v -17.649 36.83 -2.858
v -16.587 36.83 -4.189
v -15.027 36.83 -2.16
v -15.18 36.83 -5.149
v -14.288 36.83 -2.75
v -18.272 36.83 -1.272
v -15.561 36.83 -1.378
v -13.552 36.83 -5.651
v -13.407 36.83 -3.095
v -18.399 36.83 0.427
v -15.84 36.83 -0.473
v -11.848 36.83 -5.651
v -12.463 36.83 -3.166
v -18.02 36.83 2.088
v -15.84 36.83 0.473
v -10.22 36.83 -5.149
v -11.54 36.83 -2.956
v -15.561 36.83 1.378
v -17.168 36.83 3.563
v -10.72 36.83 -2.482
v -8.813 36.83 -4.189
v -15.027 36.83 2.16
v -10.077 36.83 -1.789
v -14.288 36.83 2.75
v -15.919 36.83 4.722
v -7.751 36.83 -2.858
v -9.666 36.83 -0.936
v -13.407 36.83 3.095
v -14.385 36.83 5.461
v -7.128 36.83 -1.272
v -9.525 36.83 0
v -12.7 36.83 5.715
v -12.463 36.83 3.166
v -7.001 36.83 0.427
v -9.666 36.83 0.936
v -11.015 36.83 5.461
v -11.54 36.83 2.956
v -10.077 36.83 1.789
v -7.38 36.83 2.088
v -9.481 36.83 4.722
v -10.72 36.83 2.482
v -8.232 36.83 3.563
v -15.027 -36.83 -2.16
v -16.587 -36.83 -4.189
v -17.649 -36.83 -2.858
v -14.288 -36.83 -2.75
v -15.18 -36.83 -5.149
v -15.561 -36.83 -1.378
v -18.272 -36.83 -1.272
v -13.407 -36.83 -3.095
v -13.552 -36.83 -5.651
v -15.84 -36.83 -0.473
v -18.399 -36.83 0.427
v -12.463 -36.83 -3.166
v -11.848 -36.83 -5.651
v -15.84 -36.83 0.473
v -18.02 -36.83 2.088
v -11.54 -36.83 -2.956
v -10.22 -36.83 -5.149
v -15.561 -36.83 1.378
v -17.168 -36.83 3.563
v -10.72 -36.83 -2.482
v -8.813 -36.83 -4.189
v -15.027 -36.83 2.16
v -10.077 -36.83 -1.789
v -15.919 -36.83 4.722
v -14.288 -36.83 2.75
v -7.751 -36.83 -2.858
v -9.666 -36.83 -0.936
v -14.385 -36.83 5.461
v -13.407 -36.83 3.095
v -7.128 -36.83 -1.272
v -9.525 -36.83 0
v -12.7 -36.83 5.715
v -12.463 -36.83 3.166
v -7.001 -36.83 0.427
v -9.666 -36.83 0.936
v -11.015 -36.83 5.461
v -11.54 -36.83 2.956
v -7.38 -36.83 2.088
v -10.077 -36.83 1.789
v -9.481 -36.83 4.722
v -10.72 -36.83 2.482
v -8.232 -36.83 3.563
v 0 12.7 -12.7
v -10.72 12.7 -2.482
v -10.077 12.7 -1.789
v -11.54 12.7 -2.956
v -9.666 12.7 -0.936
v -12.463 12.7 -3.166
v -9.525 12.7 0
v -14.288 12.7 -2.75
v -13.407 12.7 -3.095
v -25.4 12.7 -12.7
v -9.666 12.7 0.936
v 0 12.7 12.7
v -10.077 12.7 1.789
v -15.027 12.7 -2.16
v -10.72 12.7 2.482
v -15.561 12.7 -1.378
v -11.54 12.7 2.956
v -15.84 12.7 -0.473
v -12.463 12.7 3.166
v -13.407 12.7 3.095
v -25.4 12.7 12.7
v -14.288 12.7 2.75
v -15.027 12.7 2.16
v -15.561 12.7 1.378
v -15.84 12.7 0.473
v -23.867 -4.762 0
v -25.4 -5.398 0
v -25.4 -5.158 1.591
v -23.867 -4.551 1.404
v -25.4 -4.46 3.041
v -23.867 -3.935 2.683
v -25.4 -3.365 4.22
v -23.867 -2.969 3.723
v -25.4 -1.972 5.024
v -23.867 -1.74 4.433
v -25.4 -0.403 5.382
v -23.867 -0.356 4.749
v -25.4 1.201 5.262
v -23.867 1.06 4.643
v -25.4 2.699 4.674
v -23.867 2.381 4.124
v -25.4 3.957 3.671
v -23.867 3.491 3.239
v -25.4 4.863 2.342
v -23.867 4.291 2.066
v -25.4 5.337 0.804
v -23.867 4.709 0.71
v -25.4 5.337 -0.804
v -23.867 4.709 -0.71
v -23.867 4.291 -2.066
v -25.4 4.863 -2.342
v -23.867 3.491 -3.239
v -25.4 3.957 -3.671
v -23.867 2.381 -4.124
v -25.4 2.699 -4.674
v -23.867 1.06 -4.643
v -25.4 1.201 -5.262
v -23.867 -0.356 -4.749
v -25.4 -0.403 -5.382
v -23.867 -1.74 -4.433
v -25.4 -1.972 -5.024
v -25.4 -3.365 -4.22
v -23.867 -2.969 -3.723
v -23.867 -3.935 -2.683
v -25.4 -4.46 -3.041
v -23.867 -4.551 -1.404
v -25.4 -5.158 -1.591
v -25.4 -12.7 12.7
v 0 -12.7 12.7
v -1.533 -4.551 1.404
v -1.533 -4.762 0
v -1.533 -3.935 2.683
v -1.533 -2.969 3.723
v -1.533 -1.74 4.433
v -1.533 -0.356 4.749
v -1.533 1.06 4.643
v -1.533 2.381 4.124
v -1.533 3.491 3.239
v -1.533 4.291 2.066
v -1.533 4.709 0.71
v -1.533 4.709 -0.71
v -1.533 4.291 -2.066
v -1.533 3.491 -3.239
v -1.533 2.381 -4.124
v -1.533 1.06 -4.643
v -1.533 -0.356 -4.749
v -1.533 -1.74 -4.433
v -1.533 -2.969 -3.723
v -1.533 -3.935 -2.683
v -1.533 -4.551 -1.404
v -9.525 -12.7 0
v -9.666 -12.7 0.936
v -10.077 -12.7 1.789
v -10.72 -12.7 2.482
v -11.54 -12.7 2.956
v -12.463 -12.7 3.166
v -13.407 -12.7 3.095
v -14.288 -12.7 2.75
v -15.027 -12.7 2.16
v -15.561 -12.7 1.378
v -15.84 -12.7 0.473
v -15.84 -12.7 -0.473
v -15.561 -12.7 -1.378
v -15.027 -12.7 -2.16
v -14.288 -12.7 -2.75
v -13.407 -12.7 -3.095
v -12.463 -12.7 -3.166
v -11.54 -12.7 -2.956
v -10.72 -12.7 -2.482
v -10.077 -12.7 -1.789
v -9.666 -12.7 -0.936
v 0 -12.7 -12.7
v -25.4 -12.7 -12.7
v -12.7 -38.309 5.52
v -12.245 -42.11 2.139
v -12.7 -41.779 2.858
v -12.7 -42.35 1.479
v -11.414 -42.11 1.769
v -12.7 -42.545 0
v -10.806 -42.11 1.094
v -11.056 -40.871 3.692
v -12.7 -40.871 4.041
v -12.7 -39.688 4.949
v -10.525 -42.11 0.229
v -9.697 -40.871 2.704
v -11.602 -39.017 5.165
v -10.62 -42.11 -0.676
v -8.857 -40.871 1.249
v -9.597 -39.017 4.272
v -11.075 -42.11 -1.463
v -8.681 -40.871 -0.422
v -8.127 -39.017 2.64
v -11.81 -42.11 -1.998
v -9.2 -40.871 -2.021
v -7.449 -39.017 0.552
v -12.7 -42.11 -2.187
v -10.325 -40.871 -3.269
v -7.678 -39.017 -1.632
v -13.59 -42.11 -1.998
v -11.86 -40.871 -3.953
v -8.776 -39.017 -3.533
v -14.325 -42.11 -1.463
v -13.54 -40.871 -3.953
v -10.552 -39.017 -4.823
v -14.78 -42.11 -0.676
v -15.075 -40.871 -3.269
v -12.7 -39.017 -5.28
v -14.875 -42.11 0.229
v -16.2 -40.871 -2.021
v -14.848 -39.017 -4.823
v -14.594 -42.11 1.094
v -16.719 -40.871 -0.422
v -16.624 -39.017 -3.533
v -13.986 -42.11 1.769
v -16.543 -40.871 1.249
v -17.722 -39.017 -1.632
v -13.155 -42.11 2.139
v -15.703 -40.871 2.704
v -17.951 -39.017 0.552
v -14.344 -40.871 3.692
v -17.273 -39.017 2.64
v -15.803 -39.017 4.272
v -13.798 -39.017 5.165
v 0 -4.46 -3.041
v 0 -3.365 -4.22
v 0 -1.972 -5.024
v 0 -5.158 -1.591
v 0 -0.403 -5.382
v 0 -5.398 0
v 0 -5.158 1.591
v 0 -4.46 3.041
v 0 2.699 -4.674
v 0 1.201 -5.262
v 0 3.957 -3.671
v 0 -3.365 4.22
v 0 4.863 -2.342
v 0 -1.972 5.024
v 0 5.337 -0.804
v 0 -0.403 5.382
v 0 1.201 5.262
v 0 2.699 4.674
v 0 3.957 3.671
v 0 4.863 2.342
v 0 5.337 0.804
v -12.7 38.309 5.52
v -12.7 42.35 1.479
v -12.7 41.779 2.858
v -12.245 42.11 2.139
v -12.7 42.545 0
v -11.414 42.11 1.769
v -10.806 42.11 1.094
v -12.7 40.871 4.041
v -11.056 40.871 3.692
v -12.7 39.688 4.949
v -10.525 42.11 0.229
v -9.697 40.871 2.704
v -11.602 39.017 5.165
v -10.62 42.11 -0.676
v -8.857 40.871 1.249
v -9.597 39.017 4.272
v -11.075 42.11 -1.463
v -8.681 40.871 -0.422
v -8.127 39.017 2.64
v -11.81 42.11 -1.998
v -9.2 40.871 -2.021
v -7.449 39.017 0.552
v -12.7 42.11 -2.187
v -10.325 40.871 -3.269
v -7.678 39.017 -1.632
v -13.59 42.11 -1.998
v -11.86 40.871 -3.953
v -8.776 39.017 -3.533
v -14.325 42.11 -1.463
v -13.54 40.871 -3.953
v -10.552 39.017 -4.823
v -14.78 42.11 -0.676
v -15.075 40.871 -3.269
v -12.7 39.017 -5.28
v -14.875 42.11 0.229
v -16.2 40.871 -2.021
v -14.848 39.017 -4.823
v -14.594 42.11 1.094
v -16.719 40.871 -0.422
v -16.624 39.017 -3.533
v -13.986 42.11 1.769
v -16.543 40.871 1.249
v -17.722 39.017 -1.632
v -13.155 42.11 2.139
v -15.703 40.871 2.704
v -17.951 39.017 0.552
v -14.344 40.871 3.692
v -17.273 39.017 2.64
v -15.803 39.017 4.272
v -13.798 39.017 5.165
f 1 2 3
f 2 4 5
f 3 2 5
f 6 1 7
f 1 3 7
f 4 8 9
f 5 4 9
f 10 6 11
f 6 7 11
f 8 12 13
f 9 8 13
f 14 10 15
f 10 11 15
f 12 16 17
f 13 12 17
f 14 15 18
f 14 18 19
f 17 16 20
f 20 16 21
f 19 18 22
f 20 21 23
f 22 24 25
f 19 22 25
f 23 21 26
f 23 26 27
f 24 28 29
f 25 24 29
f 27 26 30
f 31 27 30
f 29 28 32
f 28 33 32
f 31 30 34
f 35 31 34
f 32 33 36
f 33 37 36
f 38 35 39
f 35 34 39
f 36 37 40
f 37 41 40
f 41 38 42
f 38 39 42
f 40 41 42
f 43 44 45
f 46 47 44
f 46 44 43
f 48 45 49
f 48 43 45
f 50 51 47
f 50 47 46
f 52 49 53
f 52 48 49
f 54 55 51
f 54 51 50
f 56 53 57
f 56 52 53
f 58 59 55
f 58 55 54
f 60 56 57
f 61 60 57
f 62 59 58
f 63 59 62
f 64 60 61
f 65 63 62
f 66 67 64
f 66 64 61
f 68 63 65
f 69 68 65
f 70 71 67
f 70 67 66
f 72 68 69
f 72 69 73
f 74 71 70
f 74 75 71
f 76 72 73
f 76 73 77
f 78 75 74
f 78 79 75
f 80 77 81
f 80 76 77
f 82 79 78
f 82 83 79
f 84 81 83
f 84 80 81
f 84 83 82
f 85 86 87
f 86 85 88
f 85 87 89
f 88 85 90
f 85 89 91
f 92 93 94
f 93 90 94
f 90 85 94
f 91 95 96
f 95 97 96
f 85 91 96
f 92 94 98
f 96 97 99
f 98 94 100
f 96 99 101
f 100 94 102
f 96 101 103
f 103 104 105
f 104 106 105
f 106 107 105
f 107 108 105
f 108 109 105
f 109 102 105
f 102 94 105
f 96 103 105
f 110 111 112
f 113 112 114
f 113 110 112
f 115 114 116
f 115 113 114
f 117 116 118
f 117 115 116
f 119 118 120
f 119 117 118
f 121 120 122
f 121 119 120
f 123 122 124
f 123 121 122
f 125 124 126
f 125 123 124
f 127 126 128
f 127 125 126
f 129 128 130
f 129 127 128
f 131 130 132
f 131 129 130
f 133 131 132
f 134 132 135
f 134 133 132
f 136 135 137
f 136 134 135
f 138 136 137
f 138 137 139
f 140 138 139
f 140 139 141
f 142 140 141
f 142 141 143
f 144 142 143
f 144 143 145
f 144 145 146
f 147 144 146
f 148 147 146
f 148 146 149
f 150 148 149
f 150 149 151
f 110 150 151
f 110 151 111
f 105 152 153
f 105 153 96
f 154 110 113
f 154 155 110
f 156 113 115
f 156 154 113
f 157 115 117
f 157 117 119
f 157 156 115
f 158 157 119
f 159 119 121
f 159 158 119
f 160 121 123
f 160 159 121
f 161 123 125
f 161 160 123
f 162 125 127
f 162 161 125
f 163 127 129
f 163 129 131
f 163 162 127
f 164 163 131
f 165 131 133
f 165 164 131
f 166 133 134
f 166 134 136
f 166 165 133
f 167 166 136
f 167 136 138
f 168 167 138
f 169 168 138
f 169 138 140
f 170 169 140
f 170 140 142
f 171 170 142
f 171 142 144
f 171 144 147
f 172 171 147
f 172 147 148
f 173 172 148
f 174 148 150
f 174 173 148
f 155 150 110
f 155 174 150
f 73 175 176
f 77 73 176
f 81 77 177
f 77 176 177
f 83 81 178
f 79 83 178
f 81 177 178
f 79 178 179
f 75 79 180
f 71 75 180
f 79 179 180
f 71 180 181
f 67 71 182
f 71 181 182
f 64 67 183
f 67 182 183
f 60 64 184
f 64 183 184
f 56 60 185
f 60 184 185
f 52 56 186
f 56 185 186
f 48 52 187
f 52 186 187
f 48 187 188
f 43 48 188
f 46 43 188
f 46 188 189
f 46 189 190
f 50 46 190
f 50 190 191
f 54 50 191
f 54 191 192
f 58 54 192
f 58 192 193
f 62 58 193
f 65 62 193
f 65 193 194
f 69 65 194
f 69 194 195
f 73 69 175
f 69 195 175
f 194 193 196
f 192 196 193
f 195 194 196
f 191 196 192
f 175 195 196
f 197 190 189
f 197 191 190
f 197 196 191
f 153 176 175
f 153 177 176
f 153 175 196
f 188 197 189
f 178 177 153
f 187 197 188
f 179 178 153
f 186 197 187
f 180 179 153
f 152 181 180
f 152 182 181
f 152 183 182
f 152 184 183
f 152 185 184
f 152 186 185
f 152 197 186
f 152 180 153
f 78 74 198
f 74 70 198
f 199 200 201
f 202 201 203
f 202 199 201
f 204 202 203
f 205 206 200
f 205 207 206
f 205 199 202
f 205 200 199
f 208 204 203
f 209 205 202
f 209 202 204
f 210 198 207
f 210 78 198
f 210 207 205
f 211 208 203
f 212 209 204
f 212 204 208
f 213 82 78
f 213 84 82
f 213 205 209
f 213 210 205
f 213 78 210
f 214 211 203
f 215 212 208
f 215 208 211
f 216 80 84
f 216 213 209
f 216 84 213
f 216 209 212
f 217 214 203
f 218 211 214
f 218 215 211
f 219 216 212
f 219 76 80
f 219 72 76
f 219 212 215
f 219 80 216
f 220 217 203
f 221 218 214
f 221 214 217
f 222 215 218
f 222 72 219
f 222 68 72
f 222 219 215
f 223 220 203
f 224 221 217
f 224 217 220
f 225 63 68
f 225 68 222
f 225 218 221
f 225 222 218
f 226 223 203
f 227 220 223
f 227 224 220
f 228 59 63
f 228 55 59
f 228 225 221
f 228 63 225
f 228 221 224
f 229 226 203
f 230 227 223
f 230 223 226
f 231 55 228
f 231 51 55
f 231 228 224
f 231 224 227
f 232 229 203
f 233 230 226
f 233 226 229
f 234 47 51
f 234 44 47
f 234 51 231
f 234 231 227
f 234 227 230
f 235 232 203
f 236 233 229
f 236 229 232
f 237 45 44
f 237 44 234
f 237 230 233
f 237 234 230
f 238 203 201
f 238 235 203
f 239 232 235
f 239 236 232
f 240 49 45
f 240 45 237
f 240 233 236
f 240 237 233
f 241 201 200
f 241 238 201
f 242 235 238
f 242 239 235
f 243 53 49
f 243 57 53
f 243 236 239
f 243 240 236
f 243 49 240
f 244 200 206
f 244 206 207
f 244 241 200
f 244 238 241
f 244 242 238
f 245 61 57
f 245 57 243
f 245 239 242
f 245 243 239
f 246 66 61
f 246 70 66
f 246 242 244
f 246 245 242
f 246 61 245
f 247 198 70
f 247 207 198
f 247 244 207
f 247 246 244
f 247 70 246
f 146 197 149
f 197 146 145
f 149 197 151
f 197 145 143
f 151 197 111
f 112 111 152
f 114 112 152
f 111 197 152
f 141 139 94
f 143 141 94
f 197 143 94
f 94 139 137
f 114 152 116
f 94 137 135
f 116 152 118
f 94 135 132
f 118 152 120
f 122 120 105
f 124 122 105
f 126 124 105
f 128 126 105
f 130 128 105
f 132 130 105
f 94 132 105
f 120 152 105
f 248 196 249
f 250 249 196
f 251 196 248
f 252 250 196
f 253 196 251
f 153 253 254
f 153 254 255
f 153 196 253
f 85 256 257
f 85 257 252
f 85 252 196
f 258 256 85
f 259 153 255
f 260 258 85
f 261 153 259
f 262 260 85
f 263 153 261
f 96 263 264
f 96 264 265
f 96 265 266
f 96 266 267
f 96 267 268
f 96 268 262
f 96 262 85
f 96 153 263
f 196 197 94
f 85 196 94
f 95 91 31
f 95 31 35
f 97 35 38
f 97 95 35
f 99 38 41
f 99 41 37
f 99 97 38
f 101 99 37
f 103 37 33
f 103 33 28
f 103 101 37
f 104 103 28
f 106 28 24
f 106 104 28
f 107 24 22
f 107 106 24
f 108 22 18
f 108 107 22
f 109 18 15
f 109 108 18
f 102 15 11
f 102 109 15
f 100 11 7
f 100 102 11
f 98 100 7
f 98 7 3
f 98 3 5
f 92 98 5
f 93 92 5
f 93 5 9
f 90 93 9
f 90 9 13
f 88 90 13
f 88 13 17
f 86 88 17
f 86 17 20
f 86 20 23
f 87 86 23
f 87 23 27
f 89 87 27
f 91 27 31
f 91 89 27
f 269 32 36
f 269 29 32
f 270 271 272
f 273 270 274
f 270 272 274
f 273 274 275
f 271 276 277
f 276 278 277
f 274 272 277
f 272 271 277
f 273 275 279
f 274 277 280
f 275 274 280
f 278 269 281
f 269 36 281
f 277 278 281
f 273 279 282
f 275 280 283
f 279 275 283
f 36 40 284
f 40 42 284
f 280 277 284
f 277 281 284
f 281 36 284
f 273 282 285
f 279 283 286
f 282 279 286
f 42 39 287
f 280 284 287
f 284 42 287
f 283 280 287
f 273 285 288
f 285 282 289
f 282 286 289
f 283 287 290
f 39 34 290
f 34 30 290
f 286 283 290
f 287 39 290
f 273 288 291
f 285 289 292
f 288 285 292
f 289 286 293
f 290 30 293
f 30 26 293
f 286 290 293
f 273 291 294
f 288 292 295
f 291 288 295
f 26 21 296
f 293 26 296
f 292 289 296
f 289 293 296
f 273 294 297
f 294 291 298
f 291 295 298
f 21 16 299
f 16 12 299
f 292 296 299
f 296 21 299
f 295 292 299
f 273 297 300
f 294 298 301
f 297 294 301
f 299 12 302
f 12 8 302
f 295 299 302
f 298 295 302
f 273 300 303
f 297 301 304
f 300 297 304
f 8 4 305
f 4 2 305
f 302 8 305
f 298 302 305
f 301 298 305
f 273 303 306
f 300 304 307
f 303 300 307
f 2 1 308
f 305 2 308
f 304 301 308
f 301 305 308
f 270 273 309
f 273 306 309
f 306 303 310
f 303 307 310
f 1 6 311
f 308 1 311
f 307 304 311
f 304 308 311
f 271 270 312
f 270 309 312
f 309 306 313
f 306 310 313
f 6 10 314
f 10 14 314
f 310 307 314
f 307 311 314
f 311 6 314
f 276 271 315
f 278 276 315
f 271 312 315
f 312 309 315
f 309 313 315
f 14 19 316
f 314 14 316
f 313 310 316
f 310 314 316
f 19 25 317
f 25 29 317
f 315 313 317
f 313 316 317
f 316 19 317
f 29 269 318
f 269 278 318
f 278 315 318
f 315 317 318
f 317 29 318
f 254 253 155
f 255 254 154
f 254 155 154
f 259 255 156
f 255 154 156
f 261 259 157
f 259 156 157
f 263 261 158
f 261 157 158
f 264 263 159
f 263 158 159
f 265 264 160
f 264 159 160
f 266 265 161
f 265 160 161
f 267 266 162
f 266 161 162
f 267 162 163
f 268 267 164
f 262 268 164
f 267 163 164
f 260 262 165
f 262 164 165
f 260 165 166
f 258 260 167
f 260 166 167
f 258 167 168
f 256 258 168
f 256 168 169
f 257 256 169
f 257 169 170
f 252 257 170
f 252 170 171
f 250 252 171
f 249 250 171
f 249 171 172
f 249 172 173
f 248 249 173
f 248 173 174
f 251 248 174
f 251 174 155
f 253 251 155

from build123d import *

# Parameters (mm, degrees)
F0_W           = 25.4
F0_H           = 25.4
F1_DEPTH       = 12.7
F3_D           = 9.525
F3_CSINK_D     = 10.795
F3_CSINK_ANGLE = 45
F5_R           = 3.175
F6_DEPTH       = 24.13


# Not quite as in the source:
# - a pattern or mirror of a feature is missing from the dataset's text; its kind, count and spacing are read off the source's solid


with BuildPart() as f1:
    # F0 (on Right) → F1 (new body)
    with BuildSketch(Plane.YZ):
        Rectangle(F0_W, F0_H)
    extrude(amount=-F1_DEPTH)

    # F3 (through all)
    with Locations(Plane.YZ):
        with Locations((0, 0)):
            CounterSinkHole(F3_D / 2, F3_CSINK_D / 2, counter_sink_angle=F3_CSINK_ANGLE)

    # F4: F1 across face


with BuildPart() as f1_1:
    add(f1.part)
    add(f1.part.mirror(Plane(origin=(-12.7, 0, 0), x_dir=(0, 1, 0), z_dir=(-1, 0, 0))))

    # F5 (on face) → F6 (join)
    with BuildSketch(Plane.XZ.offset(12.7)):
        with Locations((-12.7, 0)):
            Circle(F5_R)
    f6 = extrude(amount=F6_DEPTH)

    # F6_copies: F6 across plane
    add(f6.mirror(Plane.ZX))

    # F8 (on offset) → F9 (revolve)
    with BuildSketch(Plane(origin=(-12.7, 0, 0), x_dir=(0, -1, 0), z_dir=(-1, 0, 0))):
        with BuildLine():
            Line((36.83, 5.715), (36.83, 3.175))
            Line((36.83, 3.175), (36.83, 0))
            Line((36.83, 0), (42.545, 0))
            ThreePointArc((42.545, 0), (40.8711152545, 4.0411152545), (36.83, 5.715))
        make_face()
    f9 = revolve(axis=Axis((-12.7, -39.6875, 0), (0, 1, 0)))

    # F9_copies: F9 across plane
    add(f9.mirror(Plane.ZX))


solid = f1_1.part
